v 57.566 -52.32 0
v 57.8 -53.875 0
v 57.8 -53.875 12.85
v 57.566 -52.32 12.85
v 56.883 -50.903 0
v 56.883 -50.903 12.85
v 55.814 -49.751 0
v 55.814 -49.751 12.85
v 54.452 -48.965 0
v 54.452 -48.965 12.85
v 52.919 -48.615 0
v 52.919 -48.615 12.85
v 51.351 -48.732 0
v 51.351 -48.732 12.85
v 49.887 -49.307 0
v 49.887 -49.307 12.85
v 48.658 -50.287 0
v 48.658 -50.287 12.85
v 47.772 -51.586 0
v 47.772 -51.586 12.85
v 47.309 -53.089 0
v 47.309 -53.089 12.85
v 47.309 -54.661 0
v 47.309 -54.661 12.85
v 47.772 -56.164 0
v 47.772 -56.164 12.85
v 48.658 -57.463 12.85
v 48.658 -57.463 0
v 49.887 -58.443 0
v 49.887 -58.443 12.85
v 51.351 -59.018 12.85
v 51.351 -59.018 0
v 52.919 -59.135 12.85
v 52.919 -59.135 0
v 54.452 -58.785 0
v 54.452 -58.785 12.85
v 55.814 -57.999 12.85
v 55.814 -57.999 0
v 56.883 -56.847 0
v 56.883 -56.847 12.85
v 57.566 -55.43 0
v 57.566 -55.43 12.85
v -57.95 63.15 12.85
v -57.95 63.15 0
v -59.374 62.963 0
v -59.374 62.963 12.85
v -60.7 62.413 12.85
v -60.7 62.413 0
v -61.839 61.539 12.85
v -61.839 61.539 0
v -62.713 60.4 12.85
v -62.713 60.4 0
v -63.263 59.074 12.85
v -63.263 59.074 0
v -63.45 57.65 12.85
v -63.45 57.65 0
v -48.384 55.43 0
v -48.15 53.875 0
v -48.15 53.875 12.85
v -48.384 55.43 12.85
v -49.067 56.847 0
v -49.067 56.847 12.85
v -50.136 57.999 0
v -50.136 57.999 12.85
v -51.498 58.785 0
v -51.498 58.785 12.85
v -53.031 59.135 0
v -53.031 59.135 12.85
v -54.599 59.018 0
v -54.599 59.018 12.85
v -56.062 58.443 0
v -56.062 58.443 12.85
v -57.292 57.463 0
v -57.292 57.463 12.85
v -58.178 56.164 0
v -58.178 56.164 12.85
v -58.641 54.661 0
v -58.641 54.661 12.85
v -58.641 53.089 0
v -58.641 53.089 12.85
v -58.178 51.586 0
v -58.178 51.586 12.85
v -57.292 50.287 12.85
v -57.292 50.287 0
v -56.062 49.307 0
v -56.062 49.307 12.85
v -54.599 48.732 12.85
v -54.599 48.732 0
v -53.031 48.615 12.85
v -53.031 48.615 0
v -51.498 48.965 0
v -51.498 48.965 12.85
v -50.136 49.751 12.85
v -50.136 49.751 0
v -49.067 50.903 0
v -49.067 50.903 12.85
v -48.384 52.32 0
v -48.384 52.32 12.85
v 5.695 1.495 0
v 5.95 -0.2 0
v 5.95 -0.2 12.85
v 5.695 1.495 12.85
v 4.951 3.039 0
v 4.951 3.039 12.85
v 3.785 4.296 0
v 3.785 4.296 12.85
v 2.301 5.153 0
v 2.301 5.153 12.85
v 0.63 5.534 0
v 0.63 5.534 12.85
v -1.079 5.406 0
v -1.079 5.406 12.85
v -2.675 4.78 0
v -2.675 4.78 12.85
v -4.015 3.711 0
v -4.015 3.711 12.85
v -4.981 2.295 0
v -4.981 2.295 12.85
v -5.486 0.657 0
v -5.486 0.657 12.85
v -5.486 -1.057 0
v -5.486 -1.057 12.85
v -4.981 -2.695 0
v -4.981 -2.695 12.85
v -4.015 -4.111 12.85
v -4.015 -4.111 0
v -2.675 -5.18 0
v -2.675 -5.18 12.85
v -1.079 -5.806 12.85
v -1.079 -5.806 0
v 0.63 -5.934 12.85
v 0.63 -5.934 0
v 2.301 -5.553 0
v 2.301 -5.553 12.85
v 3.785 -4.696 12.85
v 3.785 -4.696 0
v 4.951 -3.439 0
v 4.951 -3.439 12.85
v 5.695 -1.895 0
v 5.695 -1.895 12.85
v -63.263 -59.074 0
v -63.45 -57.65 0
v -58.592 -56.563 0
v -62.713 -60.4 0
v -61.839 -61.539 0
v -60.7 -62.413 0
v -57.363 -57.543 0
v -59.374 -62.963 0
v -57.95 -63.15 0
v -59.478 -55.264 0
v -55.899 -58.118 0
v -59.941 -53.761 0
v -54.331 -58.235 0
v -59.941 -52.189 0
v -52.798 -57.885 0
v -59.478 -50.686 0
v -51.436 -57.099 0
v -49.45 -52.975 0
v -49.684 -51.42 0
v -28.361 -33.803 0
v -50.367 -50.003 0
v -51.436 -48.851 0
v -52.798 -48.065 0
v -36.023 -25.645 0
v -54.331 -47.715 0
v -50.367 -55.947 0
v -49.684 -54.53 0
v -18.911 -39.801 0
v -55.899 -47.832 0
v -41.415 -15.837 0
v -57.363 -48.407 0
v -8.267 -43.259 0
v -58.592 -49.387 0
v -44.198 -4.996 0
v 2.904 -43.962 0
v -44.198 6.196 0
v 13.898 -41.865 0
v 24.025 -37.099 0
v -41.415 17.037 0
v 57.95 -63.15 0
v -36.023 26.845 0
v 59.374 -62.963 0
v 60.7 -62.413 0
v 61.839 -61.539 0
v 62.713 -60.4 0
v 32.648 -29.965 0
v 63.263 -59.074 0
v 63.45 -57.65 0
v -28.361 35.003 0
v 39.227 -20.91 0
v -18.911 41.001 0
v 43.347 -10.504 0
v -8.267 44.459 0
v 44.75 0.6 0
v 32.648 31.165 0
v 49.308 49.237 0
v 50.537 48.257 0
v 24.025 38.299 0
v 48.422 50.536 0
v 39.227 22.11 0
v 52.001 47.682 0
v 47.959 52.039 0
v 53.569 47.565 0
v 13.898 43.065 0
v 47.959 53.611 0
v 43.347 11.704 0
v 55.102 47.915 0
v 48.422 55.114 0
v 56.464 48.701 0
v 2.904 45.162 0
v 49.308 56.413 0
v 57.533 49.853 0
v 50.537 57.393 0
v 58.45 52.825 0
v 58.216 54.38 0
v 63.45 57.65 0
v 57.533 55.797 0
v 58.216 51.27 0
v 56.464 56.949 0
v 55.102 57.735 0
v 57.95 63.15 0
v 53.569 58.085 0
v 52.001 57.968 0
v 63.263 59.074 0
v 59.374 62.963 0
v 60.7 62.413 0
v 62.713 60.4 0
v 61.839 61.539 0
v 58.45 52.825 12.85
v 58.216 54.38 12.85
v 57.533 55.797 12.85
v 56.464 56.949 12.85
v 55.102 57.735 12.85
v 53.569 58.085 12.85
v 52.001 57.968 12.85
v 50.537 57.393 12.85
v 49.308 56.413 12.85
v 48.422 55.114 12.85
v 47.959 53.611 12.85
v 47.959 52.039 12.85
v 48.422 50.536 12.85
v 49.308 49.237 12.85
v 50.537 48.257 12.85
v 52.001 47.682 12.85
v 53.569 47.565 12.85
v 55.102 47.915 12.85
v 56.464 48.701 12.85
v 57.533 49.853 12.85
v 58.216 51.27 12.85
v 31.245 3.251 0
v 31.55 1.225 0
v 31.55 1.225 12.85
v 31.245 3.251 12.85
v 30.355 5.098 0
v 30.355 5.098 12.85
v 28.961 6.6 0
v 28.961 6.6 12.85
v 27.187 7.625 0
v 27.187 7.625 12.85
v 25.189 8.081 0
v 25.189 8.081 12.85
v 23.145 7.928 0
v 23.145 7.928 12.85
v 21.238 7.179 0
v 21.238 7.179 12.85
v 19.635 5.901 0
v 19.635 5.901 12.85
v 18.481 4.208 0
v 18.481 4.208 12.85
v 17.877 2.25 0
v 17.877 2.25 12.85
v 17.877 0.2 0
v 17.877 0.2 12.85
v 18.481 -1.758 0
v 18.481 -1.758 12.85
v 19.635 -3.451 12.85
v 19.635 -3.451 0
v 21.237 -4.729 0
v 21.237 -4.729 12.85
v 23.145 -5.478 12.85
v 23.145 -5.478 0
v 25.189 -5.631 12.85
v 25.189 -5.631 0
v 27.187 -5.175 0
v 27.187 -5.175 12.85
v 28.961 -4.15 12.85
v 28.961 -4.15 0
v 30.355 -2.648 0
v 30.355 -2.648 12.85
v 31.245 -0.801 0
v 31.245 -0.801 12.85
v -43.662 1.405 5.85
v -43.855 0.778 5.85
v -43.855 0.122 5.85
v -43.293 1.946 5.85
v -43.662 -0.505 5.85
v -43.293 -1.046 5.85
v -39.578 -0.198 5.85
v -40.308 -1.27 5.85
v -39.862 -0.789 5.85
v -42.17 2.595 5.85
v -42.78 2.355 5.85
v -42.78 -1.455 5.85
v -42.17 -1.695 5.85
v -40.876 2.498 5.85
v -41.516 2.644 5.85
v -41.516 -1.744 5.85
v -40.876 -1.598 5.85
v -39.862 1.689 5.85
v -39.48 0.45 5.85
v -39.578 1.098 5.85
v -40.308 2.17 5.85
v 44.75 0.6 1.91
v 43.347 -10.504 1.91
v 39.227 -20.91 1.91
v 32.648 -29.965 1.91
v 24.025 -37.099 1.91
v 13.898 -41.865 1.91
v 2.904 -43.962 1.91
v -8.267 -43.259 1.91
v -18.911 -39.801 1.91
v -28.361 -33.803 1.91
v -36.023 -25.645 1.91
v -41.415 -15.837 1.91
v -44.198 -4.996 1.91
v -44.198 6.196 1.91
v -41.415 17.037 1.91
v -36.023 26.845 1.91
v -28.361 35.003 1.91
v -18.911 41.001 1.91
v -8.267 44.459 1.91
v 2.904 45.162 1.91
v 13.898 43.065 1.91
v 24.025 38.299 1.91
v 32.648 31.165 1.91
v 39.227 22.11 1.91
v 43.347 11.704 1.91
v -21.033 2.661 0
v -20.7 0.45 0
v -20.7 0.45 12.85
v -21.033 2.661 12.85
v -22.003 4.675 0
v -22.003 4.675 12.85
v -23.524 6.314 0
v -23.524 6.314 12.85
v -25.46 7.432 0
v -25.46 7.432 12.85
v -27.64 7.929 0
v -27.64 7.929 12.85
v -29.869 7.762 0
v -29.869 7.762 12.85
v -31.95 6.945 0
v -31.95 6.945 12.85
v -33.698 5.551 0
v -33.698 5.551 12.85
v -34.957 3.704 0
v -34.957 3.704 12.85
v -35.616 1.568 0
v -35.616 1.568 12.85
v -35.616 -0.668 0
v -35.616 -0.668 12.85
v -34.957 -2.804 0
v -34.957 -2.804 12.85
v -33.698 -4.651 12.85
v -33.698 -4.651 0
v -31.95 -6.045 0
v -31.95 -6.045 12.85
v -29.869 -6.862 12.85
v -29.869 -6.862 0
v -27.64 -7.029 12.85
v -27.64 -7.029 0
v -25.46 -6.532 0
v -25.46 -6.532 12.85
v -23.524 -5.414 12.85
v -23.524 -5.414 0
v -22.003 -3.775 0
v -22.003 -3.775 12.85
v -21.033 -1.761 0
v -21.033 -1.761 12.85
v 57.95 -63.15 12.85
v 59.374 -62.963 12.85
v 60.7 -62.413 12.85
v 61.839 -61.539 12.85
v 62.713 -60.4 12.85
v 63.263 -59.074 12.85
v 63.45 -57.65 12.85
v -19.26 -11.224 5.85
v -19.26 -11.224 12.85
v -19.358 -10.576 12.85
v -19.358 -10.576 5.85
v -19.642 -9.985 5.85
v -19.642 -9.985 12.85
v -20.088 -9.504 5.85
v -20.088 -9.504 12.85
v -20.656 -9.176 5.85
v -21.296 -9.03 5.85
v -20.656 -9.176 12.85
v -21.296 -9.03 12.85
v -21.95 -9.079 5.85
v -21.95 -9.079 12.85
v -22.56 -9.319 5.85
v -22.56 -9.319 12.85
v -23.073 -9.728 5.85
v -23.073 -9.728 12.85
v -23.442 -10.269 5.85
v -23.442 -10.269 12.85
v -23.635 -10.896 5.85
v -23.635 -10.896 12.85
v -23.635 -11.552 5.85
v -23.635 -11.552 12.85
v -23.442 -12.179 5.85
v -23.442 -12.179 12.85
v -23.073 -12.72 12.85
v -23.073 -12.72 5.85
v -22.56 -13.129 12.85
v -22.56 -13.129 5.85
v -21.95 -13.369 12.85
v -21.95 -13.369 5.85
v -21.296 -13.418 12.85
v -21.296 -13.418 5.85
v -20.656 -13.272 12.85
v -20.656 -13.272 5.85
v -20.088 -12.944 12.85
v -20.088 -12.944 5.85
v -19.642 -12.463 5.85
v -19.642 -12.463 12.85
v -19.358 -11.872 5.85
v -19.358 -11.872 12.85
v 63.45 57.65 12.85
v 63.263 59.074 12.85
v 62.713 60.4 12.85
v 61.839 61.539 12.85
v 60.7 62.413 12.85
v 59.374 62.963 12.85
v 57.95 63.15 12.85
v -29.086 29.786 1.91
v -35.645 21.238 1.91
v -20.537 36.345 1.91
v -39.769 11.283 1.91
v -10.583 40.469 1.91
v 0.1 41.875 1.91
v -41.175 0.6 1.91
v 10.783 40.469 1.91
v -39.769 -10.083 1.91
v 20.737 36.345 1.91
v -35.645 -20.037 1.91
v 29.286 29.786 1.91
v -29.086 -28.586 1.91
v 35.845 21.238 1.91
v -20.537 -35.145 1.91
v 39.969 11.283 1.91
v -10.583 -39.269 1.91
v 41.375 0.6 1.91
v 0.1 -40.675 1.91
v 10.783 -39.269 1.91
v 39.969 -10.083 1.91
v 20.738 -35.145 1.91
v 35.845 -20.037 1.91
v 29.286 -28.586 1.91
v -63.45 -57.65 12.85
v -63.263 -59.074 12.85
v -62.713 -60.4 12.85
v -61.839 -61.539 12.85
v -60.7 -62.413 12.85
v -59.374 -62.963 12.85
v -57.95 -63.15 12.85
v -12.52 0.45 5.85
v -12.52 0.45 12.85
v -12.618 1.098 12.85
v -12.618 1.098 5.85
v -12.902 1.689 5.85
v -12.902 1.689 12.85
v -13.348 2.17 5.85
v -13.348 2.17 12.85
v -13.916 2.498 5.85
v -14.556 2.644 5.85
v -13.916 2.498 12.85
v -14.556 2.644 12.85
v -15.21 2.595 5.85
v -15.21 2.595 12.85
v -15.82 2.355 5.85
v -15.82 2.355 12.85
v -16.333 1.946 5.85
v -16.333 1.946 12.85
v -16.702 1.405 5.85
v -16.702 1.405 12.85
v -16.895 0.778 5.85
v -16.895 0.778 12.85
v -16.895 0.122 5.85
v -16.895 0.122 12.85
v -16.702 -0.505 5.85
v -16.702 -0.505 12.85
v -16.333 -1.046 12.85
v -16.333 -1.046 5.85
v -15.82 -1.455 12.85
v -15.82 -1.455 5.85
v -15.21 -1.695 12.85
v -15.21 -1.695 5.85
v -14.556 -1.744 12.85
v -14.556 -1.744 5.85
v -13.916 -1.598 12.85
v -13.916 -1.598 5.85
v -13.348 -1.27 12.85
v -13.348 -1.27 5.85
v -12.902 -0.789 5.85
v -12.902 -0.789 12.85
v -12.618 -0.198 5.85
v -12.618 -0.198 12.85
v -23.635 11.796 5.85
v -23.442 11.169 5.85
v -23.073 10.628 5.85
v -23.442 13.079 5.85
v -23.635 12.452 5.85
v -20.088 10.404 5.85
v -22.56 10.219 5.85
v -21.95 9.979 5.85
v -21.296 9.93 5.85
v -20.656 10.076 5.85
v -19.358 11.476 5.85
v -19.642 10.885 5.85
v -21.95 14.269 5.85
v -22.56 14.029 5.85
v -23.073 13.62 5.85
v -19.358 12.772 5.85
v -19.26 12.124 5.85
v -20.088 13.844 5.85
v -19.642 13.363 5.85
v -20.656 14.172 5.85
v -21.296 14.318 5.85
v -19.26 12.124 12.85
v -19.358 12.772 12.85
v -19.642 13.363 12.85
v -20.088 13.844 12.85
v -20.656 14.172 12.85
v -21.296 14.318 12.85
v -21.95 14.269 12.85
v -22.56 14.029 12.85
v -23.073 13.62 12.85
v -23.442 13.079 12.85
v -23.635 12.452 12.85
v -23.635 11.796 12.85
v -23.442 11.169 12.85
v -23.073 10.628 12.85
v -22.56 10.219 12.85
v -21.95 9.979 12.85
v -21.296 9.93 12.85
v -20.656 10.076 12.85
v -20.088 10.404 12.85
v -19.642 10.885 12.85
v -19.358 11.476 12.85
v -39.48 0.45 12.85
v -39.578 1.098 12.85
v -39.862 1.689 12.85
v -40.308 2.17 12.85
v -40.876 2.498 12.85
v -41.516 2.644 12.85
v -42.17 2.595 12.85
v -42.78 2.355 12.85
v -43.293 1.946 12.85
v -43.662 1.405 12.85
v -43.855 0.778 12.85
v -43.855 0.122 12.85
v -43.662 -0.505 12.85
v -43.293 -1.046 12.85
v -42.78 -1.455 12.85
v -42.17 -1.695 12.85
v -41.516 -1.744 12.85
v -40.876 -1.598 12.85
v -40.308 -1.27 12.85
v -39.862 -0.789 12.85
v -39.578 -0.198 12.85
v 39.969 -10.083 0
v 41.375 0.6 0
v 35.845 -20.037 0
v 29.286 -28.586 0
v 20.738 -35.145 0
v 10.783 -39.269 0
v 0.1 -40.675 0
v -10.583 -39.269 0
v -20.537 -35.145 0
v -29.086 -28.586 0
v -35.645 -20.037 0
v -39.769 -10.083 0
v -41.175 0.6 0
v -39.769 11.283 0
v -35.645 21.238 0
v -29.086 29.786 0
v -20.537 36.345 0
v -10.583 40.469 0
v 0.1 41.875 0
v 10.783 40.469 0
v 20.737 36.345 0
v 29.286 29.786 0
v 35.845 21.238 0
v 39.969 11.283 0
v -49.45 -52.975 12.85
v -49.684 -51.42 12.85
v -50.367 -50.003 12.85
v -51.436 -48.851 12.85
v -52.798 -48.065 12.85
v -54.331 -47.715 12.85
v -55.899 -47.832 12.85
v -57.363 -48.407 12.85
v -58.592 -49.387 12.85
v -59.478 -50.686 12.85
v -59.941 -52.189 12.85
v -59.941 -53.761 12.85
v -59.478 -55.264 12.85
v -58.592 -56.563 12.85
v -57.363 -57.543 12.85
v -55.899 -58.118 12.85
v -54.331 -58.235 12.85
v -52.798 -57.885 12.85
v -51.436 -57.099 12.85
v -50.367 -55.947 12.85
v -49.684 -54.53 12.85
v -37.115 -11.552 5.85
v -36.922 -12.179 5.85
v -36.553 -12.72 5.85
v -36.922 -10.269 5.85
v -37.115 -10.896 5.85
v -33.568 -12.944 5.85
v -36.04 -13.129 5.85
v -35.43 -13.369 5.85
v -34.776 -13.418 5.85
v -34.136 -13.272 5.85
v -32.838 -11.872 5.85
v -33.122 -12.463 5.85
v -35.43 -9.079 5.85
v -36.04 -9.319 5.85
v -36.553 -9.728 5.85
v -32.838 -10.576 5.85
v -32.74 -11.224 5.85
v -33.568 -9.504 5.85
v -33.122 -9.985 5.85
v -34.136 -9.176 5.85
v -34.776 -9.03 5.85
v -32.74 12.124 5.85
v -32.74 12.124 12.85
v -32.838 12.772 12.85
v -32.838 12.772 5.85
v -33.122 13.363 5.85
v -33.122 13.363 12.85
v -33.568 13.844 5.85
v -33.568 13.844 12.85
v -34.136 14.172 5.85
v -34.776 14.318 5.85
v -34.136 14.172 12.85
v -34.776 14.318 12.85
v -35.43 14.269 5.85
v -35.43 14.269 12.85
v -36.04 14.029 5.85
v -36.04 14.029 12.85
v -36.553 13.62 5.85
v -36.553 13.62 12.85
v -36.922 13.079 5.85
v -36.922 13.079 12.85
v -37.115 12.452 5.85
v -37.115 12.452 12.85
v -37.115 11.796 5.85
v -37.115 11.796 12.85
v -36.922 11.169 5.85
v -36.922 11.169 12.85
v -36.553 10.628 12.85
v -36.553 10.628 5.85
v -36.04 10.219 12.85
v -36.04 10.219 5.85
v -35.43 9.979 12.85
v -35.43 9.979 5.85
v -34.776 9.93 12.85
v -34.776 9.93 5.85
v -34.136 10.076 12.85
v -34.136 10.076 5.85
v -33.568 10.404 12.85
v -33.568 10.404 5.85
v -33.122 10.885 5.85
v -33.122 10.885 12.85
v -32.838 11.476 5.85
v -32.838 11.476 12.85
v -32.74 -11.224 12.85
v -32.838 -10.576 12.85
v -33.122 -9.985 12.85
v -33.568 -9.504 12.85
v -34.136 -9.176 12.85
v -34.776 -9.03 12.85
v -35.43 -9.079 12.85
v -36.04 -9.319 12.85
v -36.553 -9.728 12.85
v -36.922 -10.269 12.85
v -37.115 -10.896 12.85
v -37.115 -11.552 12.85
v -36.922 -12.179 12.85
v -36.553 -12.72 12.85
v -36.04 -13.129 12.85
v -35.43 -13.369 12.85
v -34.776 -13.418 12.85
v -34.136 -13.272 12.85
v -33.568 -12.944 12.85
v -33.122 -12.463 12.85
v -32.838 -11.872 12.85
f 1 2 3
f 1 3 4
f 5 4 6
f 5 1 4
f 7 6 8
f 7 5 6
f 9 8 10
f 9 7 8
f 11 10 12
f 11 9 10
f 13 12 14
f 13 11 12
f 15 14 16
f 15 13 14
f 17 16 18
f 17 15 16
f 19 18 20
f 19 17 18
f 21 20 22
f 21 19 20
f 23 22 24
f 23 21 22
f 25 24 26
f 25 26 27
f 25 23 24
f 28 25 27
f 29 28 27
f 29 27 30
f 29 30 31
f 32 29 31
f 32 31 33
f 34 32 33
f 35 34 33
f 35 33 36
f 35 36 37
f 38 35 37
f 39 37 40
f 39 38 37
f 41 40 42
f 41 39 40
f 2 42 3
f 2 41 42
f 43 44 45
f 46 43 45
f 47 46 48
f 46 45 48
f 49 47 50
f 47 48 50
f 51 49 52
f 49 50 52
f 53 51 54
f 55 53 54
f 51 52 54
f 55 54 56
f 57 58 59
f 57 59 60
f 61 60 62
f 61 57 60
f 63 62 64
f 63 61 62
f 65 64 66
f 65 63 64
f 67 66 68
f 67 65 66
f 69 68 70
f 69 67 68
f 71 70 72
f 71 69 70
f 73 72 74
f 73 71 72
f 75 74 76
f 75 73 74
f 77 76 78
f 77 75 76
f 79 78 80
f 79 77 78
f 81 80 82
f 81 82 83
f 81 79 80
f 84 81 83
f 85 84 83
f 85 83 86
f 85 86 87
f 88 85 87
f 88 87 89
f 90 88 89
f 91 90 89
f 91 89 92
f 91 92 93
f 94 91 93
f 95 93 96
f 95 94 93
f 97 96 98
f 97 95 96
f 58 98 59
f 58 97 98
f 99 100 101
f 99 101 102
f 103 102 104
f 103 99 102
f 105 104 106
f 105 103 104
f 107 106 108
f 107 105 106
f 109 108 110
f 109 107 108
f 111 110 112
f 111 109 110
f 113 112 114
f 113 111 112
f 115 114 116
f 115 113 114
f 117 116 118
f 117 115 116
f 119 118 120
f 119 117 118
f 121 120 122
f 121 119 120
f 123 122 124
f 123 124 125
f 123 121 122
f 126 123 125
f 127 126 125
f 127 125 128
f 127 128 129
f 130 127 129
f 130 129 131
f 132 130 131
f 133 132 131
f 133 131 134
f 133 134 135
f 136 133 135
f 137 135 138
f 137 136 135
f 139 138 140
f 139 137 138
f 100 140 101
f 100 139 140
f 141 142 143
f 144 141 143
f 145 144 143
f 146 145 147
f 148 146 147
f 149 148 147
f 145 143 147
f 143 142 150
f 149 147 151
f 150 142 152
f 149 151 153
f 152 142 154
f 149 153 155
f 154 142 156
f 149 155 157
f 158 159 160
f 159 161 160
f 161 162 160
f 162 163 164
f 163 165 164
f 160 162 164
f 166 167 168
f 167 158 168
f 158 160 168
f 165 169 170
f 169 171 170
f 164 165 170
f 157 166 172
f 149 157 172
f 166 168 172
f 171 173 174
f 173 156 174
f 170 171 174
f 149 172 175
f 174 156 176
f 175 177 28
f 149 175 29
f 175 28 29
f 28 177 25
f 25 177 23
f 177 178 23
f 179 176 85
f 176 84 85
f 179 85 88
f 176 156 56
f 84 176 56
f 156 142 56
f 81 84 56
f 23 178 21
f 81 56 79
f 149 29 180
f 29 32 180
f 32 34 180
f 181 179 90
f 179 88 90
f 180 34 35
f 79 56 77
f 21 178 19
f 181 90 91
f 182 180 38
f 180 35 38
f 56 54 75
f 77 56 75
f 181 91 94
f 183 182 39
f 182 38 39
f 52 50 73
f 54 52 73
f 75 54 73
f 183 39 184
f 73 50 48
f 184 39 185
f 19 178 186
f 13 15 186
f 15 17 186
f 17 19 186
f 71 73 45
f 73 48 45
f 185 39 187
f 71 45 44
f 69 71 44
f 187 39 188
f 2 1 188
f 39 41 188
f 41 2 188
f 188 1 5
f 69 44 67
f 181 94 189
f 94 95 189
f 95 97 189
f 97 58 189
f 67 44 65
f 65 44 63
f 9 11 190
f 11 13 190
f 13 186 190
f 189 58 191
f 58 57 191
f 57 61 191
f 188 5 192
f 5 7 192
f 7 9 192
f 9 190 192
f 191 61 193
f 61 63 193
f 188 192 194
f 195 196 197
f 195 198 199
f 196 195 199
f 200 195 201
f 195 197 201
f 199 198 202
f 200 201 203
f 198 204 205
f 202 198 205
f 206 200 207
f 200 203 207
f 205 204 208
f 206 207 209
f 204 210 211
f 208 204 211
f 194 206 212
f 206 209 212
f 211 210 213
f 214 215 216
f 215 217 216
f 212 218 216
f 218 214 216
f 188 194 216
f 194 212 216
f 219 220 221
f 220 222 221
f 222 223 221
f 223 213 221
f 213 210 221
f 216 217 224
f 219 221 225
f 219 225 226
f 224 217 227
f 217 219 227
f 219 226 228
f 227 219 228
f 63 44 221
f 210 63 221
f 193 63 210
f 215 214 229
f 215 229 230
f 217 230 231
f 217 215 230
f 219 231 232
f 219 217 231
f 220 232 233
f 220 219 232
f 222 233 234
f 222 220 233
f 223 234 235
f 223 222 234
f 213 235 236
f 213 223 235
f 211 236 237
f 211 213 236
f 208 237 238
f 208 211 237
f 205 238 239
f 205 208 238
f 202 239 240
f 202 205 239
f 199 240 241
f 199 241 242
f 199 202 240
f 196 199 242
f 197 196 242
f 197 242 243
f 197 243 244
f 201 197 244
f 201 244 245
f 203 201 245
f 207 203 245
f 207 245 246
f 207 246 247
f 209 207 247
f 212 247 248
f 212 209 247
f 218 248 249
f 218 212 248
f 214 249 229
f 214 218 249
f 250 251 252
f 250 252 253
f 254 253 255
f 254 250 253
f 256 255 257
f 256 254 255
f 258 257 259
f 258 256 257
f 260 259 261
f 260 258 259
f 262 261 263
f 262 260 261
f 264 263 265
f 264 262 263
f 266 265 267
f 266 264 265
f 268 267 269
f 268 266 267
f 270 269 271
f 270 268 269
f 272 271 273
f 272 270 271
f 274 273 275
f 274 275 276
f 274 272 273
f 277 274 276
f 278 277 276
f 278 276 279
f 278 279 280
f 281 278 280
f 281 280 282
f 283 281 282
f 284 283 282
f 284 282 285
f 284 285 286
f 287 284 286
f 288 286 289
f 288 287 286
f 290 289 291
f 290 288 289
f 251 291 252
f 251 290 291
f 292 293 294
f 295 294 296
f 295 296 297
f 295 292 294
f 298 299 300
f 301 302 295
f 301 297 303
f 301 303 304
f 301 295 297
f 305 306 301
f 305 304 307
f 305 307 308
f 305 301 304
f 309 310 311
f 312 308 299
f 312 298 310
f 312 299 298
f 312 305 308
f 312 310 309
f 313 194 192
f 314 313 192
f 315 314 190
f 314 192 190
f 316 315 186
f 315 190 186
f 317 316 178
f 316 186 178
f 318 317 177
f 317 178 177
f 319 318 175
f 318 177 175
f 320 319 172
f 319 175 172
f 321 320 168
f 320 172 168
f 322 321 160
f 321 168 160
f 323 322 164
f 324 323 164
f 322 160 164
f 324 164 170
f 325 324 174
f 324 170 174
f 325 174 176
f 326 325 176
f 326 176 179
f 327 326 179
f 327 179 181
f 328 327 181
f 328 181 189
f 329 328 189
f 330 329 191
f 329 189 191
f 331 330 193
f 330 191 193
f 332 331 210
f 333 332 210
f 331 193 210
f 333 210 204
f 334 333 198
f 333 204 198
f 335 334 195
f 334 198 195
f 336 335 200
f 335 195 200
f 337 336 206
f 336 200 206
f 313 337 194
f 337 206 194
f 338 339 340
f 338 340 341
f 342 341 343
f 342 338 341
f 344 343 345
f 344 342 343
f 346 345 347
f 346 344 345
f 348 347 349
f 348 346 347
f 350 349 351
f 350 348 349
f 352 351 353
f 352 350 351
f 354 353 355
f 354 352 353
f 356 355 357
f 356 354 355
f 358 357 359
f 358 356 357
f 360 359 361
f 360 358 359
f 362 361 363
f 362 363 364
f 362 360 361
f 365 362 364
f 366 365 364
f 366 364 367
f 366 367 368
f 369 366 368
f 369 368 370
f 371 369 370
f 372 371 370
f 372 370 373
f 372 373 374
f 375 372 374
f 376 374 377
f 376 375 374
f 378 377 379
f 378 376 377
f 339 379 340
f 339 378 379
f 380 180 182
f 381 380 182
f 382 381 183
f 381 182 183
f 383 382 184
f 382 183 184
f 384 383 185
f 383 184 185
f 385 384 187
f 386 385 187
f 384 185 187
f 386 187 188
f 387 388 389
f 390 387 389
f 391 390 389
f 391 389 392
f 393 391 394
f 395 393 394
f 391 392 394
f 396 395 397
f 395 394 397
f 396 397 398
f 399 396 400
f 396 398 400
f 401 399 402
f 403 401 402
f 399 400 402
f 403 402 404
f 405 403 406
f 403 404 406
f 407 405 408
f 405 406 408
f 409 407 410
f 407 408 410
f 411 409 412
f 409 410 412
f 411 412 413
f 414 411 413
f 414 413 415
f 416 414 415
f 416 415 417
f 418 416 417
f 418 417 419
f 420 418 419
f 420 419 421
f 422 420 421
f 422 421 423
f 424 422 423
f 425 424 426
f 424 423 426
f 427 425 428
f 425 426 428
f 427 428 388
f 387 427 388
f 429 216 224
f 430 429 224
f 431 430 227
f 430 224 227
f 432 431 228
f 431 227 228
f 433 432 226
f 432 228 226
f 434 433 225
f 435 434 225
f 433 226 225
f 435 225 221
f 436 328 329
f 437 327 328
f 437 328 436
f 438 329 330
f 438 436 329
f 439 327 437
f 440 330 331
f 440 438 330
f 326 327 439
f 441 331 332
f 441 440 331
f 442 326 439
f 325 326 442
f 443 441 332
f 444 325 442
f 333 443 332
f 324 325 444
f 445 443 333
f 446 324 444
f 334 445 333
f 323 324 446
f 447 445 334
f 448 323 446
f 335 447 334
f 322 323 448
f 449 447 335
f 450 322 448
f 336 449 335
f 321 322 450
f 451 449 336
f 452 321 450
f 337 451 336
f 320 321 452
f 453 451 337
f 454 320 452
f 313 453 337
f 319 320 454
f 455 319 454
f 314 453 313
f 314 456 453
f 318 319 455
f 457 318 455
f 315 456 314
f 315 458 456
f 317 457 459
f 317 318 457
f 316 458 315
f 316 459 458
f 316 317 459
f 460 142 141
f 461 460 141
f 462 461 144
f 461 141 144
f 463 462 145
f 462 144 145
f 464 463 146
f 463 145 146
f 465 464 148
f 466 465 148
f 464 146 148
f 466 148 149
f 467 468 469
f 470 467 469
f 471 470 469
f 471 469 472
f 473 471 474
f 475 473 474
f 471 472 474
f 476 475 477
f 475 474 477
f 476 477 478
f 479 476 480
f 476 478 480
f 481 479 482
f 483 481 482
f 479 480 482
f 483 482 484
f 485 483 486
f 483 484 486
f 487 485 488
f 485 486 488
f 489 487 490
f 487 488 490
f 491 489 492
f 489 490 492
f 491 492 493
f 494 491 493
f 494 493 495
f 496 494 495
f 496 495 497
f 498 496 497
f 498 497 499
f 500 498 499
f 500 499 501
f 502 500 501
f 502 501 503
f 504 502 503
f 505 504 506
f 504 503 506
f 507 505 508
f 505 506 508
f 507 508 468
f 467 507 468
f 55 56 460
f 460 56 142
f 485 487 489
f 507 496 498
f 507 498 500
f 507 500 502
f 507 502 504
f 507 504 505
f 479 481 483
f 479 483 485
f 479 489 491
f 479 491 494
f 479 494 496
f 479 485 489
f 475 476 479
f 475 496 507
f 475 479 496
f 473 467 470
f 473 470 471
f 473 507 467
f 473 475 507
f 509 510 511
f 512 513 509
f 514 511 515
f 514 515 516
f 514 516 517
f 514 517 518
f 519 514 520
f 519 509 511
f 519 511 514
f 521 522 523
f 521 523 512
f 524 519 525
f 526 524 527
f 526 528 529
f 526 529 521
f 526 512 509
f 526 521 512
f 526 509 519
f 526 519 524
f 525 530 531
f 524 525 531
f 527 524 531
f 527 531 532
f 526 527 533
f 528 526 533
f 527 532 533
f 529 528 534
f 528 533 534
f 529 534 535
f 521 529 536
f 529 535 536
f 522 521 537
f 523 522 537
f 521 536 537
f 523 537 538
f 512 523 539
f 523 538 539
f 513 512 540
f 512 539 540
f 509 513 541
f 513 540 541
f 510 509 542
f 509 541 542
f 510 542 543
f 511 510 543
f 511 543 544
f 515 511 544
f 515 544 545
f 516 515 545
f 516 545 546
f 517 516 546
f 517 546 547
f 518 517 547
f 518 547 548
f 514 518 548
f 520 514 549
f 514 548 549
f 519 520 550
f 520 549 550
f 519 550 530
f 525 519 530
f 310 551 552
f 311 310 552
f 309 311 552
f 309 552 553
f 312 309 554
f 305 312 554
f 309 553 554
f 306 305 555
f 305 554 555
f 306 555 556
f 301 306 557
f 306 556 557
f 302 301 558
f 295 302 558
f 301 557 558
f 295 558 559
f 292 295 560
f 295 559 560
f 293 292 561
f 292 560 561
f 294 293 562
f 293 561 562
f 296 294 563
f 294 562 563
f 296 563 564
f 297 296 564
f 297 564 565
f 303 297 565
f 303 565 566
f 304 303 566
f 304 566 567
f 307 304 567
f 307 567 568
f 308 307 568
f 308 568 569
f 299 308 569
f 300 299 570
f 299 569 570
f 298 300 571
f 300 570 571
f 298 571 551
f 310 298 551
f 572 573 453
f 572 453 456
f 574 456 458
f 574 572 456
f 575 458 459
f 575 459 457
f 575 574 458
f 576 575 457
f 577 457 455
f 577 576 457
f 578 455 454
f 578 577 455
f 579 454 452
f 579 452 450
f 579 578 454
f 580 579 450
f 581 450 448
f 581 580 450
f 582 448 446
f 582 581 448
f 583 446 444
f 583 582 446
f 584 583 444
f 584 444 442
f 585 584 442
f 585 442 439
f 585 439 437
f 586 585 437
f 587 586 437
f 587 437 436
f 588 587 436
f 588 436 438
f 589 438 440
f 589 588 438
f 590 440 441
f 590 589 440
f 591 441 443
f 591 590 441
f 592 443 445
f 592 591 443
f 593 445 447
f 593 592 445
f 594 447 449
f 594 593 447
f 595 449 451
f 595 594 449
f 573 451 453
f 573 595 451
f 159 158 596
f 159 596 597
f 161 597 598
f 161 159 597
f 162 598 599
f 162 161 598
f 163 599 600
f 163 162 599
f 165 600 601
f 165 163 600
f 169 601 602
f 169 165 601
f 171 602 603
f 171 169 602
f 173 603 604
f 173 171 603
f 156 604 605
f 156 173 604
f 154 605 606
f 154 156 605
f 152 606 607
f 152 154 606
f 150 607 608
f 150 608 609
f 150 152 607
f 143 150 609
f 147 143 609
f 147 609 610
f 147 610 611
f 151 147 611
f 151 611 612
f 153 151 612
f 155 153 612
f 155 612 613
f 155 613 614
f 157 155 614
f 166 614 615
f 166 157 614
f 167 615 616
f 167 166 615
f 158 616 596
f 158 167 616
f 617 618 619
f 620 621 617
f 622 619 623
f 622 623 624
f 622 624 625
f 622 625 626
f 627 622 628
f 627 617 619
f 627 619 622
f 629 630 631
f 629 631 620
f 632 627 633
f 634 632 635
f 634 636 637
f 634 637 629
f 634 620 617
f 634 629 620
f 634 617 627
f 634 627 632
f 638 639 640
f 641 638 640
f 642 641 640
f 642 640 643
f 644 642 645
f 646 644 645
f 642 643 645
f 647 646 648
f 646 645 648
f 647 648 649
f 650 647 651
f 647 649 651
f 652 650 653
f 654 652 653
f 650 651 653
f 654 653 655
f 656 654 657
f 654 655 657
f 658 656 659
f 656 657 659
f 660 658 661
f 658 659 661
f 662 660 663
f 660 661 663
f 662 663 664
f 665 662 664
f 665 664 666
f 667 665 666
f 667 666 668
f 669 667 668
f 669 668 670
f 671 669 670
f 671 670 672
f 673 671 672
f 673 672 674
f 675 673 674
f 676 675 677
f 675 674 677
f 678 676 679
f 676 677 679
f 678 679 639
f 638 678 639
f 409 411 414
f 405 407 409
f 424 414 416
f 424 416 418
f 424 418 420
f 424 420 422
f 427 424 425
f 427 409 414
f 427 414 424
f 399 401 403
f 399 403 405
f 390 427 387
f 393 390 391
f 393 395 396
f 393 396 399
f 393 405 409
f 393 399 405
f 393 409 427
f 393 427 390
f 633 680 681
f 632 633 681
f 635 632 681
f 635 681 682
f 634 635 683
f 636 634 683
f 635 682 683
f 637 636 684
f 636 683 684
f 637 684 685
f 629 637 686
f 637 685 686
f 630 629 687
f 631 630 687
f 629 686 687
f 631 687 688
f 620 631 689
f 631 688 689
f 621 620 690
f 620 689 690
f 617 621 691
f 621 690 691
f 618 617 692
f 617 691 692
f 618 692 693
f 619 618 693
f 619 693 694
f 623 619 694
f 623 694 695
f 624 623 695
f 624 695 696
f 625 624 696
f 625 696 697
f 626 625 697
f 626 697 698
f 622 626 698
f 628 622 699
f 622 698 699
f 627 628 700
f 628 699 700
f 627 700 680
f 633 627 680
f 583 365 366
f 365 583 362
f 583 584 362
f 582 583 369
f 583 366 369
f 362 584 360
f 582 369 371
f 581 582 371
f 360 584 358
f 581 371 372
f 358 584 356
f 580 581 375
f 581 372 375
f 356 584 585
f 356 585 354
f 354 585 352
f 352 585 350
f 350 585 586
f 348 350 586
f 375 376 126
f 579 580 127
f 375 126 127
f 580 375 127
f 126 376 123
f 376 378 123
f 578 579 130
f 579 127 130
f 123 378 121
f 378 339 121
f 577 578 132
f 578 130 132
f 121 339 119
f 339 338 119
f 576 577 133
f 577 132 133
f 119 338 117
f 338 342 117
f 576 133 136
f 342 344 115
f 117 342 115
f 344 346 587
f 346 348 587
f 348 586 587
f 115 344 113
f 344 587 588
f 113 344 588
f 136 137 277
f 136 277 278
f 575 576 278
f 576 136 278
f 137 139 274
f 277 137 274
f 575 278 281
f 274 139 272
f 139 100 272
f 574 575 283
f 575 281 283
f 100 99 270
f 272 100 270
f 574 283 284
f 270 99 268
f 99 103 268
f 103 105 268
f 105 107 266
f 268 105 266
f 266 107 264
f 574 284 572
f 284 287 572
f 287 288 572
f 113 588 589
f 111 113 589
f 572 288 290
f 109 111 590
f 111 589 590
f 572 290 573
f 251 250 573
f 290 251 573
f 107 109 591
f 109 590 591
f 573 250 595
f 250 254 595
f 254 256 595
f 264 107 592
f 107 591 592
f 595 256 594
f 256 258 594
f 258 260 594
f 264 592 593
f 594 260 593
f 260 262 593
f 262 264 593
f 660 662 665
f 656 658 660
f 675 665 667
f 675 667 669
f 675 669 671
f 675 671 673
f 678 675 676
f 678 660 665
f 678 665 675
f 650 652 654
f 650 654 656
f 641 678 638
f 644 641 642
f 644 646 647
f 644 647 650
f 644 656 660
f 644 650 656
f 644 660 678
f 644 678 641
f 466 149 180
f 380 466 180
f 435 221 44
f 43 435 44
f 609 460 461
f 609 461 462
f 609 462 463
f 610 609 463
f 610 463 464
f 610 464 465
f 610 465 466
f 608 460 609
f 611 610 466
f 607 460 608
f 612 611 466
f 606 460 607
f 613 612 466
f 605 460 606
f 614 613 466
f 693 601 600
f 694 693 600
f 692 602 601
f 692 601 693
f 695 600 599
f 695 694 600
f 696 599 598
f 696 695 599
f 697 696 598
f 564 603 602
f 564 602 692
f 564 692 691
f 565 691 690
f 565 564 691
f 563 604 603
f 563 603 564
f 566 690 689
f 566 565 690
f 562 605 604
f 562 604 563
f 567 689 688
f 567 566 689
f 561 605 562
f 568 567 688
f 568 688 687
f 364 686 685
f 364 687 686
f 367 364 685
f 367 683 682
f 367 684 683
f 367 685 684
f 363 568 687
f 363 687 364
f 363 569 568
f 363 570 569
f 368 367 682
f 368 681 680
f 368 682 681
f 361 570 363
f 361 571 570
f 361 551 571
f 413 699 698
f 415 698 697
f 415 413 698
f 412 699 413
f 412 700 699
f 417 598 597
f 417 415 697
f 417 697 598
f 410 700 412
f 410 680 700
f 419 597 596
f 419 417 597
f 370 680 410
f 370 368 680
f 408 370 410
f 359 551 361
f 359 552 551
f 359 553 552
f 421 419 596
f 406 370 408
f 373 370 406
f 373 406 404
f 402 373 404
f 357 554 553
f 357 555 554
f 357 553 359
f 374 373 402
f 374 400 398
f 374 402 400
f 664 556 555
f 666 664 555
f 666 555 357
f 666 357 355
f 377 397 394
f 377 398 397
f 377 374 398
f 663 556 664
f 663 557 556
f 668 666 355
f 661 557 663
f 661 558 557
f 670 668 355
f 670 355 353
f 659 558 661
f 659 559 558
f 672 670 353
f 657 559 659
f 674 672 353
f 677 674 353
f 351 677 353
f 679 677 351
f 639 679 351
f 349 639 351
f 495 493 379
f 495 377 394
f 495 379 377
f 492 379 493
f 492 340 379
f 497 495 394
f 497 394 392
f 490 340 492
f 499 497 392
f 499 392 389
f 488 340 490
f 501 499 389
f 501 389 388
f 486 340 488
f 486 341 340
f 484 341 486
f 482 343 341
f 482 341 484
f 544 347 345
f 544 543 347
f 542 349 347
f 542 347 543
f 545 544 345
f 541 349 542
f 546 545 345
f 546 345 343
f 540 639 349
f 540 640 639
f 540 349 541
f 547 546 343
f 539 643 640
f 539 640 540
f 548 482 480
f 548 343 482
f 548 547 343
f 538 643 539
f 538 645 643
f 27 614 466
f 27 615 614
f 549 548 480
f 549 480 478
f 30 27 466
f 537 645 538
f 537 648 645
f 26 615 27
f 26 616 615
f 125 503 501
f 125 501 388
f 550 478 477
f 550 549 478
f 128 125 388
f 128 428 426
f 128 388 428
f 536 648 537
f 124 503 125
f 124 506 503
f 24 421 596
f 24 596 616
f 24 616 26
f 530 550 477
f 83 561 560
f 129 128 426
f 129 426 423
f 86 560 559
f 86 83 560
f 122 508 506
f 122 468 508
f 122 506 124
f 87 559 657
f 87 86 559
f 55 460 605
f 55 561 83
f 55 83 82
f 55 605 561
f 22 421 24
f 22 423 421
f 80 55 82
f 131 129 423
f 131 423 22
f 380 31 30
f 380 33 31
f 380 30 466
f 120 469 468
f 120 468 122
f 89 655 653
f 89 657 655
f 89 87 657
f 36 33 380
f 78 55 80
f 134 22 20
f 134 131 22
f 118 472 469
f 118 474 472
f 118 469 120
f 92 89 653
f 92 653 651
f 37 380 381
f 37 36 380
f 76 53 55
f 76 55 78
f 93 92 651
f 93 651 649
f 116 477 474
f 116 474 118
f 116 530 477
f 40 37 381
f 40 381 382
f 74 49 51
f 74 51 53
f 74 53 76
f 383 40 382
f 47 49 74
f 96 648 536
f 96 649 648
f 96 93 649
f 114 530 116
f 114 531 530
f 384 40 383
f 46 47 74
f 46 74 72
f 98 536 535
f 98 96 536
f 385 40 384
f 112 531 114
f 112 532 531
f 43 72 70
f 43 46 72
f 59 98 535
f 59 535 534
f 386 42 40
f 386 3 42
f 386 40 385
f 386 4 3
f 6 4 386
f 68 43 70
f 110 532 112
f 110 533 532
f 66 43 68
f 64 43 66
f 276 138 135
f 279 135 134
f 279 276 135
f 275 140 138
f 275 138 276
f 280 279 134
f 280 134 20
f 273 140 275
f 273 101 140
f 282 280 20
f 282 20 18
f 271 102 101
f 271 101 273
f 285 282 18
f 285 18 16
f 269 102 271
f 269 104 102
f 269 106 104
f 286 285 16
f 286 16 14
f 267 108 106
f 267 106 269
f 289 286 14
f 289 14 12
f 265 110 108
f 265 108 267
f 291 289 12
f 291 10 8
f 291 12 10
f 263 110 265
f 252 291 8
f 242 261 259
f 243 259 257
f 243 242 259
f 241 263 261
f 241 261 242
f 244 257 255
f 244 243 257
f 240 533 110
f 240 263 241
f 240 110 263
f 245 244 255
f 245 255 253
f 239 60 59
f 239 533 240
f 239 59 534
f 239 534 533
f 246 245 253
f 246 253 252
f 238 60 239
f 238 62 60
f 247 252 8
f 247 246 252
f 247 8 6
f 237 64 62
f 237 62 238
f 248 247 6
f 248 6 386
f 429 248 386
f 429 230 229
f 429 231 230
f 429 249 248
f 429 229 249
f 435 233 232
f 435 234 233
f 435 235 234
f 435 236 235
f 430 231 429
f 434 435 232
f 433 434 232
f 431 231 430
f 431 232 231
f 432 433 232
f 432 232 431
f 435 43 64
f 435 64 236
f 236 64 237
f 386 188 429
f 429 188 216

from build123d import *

# Parameters (mm, degrees)
F0_R     = 5.275
F0_R_2   = 5.75
F0_R_3   = 7.5
F0_R_4   = 6.875
F1_DEPTH = 12.85
F2_R     = 44.65
F2_R_2   = 41.275
F3_DEPTH = 1.91
F4_R     = 2.2
F5_DEPTH = 7


with BuildPart() as f1:
    # F0 (on Top) → F1 (new body)
    with BuildSketch(Plane.XY):
        with BuildLine():
            ThreePointArc((63.45, 57.65), (61.8390872965, 61.5390872965), (57.95, 63.15))
            Line((57.95, 63.15), (-57.95, 63.15))
            ThreePointArc((-57.95, 63.15), (-61.8390872965, 61.5390872965), (-63.45, 57.65))
            Line((-63.45, 57.65), (-63.45, -57.65))
            ThreePointArc((-63.45, -57.65), (-61.8390872965, -61.5390872965), (-57.95, -63.15))
            Line((-57.95, -63.15), (57.95, -63.15))
            ThreePointArc((57.95, -63.15), (61.8390872965, -61.5390872965), (63.45, -57.65))
            Line((63.45, -57.65), (63.45, 57.65))
        make_face()
        with Locations((-54.725, -52.975)):
            Circle(F0_R, mode=Mode.SUBTRACT)
        with Locations((52.525, -53.875)):
            Circle(F0_R, mode=Mode.SUBTRACT)
        with Locations((0.2, -0.2)):
            Circle(F0_R_2, mode=Mode.SUBTRACT)
        with Locations((-28.2, 0.45)):
            Circle(F0_R_3, mode=Mode.SUBTRACT)
        with Locations((-53.425, 53.875)):
            Circle(F0_R, mode=Mode.SUBTRACT)
        with Locations((24.675, 1.225)):
            Circle(F0_R_4, mode=Mode.SUBTRACT)
        with Locations((53.175, 52.825)):
            Circle(F0_R, mode=Mode.SUBTRACT)
    extrude(amount=F1_DEPTH)

    # F2 (on face) → F3 (cut)
    with BuildSketch(Plane(origin=(0, 0, 0), x_dir=(1, 0, 0), z_dir=(0, 0, -1))):
        with Locations((0.1, -0.6)):
            Circle(F2_R)
        with Locations((0.1, -0.6)):
            Circle(F2_R_2, mode=Mode.SUBTRACT)
    extrude(amount=-F3_DEPTH, mode=Mode.SUBTRACT)

    # F4 (on face) → F5 (cut)
    with BuildSketch(Plane.XY.offset(12.85)):
        with Locations((-21.46, 12.124022443)):
            Circle(F4_R)
        with Locations((-34.94, 12.124022443)):
            Circle(F4_R)
        with Locations((-41.68, 0.45)):
            Circle(F4_R)
        with Locations((-34.94, -11.224022443)):
            Circle(F4_R)
        with Locations((-21.46, -11.224022443)):
            Circle(F4_R)
        with Locations((-14.72, 0.45)):
            Circle(F4_R)
    extrude(amount=-F5_DEPTH, mode=Mode.SUBTRACT)


solid = f1.part
